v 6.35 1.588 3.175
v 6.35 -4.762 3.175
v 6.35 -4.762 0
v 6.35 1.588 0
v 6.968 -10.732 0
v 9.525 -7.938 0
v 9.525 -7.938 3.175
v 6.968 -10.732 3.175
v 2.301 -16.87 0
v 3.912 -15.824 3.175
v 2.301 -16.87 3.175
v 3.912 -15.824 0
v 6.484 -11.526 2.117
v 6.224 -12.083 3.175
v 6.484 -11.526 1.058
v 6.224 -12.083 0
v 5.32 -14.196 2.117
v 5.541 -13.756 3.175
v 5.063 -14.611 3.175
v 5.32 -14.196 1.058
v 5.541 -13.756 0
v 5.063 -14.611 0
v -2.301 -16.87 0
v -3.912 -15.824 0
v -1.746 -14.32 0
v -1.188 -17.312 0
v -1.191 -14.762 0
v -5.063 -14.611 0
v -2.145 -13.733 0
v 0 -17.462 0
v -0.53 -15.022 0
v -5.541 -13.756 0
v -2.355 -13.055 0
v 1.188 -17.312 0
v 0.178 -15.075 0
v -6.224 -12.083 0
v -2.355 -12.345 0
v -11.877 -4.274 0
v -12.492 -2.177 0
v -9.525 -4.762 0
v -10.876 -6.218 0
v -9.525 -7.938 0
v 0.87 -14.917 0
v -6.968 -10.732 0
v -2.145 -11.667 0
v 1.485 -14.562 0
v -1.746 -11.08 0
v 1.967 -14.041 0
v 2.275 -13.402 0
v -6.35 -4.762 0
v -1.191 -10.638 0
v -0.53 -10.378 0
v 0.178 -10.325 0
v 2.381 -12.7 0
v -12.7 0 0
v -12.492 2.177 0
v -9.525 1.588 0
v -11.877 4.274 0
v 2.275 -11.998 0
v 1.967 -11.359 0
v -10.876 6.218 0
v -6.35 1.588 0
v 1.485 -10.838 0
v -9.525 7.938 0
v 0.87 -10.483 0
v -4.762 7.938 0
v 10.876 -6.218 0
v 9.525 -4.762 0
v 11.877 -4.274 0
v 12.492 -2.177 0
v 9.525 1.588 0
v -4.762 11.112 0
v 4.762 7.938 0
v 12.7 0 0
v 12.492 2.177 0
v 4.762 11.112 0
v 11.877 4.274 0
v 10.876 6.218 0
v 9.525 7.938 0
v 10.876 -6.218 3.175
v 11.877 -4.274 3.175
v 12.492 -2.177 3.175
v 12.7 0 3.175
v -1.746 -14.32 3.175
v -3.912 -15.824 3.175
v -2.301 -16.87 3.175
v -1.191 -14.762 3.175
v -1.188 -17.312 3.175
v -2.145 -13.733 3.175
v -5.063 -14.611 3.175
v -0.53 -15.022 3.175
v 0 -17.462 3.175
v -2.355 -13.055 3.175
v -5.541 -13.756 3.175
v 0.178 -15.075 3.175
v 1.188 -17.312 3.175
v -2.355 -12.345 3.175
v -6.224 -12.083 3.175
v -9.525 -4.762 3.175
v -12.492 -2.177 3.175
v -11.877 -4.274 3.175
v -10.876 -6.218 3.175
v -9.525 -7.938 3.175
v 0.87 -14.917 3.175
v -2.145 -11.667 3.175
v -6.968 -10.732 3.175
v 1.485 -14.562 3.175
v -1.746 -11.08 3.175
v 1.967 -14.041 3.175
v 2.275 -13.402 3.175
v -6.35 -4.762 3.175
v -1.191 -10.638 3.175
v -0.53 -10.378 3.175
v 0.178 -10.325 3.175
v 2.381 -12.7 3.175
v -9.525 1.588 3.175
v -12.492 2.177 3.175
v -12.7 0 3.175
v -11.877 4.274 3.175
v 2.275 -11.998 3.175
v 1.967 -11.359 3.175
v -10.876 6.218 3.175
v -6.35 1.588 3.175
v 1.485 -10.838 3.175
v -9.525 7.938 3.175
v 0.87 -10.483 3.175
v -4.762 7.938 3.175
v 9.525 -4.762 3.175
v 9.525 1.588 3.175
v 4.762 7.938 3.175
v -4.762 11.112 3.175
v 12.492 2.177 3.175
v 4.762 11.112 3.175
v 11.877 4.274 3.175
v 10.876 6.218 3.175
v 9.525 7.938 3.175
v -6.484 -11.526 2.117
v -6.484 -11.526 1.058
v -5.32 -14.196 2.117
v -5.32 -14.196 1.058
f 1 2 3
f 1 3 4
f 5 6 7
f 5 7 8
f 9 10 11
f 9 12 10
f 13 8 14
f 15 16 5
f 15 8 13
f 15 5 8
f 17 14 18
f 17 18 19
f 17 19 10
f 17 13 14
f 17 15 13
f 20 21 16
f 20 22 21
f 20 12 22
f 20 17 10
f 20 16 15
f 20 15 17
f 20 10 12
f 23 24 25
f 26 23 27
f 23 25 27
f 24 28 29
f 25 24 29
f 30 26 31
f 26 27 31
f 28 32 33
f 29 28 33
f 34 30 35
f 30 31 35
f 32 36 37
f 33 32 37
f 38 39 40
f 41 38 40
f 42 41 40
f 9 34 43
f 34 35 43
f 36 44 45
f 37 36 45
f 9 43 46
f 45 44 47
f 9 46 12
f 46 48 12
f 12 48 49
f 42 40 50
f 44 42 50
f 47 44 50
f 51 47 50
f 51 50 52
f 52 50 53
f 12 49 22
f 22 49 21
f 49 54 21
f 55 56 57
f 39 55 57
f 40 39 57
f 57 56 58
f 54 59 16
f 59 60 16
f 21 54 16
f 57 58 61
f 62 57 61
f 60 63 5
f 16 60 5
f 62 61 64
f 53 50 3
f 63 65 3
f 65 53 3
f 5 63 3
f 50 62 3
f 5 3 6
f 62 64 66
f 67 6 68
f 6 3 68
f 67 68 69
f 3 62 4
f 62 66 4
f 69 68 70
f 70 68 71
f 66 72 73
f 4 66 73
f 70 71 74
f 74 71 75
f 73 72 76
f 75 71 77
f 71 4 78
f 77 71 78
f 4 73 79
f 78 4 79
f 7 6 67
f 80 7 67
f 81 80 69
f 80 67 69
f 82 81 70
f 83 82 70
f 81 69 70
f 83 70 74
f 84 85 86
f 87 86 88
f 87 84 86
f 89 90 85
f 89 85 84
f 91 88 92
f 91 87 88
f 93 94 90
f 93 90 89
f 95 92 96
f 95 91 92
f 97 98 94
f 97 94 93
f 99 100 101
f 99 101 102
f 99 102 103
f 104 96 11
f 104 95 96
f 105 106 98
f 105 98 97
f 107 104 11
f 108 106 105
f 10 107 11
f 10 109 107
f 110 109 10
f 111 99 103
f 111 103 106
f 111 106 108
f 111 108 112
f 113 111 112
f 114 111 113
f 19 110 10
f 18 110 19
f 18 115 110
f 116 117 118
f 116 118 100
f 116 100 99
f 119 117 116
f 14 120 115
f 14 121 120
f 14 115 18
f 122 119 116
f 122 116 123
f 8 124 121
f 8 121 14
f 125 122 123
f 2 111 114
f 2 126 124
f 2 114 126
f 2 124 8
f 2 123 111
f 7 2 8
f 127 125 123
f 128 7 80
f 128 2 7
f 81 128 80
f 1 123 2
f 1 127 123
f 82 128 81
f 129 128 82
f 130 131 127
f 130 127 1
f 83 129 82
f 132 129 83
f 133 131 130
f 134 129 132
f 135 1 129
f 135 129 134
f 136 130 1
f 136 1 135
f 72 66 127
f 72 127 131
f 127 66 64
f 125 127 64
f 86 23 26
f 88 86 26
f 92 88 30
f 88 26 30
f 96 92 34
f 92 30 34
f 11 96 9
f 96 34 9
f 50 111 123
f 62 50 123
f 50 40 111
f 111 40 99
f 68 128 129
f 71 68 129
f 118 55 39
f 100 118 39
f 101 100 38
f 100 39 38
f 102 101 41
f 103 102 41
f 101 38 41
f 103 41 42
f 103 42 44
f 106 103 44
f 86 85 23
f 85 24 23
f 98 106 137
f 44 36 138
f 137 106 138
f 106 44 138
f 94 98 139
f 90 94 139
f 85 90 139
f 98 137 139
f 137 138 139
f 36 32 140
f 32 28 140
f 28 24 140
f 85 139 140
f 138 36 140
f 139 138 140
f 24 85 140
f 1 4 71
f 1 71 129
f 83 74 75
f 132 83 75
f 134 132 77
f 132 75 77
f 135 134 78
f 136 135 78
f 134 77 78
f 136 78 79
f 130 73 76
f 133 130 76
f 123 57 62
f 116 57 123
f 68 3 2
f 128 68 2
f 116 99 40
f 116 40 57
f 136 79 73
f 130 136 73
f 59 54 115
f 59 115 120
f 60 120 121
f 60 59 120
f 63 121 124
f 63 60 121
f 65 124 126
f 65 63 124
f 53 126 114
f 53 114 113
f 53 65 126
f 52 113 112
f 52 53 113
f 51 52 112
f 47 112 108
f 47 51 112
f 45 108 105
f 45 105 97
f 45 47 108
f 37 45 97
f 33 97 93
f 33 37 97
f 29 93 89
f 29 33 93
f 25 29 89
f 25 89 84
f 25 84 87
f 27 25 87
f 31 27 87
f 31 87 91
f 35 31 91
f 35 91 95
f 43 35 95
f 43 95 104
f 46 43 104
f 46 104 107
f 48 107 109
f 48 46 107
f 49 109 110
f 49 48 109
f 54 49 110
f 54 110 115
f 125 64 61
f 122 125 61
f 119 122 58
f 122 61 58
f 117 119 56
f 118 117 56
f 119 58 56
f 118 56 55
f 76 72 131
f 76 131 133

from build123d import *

# Parameters (mm, degrees)
SKETCH1_W           = 9.525
SKETCH1_H           = 3.175
SKETCH1_R           = 2.38125
BOSS_EXTRUDE1_DEPTH = 3.175
CAVITY1_START       = -9.525
CAVITY1_OUTLINE_W   = 6.35
CAVITY1_OUTLINE_H   = 3.175
CAVITY1_DEPTH       = 3.175
CAVITY1_START_2     = 6.35
CAVITY1_2_OUTLINE_W = 6.35
CAVITY1_2_OUTLINE_H = 3.175
CAVITY1_2_DEPTH     = 3.175


# Read off the part's stored shape, not the designer's step: Cavity1
with BuildPart() as part:
    # Sketch1 → Boss-Extrude1 (new body)
    # profile 1 of 10: a face of its own
    with BuildSketch(Plane.XY):
        with BuildLine():
            ThreePointArc((-9.525, 7.9375), (-11.876811414, 4.274474566), (-12.7, 0))
            Line((-12.7, 0), (-9.525, 0))
            Line((-9.525, 0), (-9.525, 7.9375))
        make_face()
    # profile 2 of 10: a face of its own
    with BuildSketch(Plane.XY):
        with BuildLine():
            Line((-9.525, 0), (-12.7, 0))
            ThreePointArc((-12.7, 0), (-11.876811414, -4.274474566), (-9.525, -7.9375))
            Line((-9.525, -7.9375), (-9.525, 0))
        make_face()
    # profile 3 of 10: a face of its own
    with BuildSketch(Plane.XY):
        Polygon((-9.525, 7.9375), (-9.525, 0), (0, 0), (9.525, 0), (9.525, 7.9375), (4.7625, 7.9375), (-4.7625, 7.9375), align=None)
    # profile 4 of 10: a face of its own
    with BuildSketch(Plane.XY):
        Polygon((0, 0), (-9.525, 0), (-9.525, -7.9375), (0, -7.9375), (9.525, -7.9375), (9.525, 0), align=None)
    # profile 5 of 10: a face of its own
    with BuildSketch(Plane.XY):
        with BuildLine():
            Line((0, -7.9375), (-9.525, -7.9375))
            add(Edge.make_bspline(
                [(-9.525, -7.9375), (-8.354743729, -9.166269084), (-6.479229503, -10.75772626), (-5.396989703, -14.77189499), (-3.721125314, -16.086113374), (-2.300921541, -16.869792119)],
                knots=[0, 0, 0, 0, 0.40377748, 0.653864755, 1, 1, 1, 1], degree=3))
            ThreePointArc((-2.300921541, -16.869792119), (-4.611943257, -11.511982474), (0, -7.9375))
        make_face()
    # profile 6 of 10: a face of its own
    with BuildSketch(Plane.XY):
        with Locations((0, 9.525)):
            Rectangle(SKETCH1_W, SKETCH1_H)
    # profile 7 of 10: a face of its own
    with BuildSketch(Plane.XY):
        with BuildLine():
            Line((9.525, -7.9375), (0, -7.9375))
            ThreePointArc((0, -7.9375), (3.367596045, -9.332403955), (4.7625, -12.7))
            ThreePointArc((4.7625, -12.7), (4.1011916, -15.121081103), (2.300921541, -16.869792119))
            add(Edge.make_bspline(
                [(9.525, -7.9375), (8.354743729, -9.166269084), (6.479229503, -10.75772626), (5.396989703, -14.77189499), (3.721125314, -16.086113374), (2.300921541, -16.869792119)],
                knots=[0, 0, 0, 0, 0.40377748, 0.653864755, 1, 1, 1, 1], degree=3))
        make_face()
    # profile 8 of 10: a face of its own
    with BuildSketch(Plane.XY):
        with BuildLine():
            ThreePointArc((4.7625, -12.7), (3.367596045, -9.332403955), (0, -7.9375))
            ThreePointArc((0, -7.9375), (-4.611943257, -11.511982474), (-2.300921541, -16.869792119))
            ThreePointArc((-2.300921541, -16.869792119), (0, -17.4625), (2.300921541, -16.869792119))
            ThreePointArc((2.300921541, -16.869792119), (4.1011916, -15.121081103), (4.7625, -12.7))
        make_face()
        with Locations((0, -12.7)):
            Circle(SKETCH1_R, mode=Mode.SUBTRACT)
    # profile 9 of 10: a face of its own
    with BuildSketch(Plane.XY):
        with BuildLine():
            Line((9.525, 7.9375), (9.525, 0))
            Line((9.525, 0), (12.7, 0))
            ThreePointArc((12.7, 0), (11.876811414, 4.274474566), (9.525, 7.9375))
        make_face()
    # profile 10 of 10: a face of its own
    with BuildSketch(Plane.XY):
        with BuildLine():
            Line((12.7, 0), (9.525, 0))
            Line((9.525, 0), (9.525, -7.9375))
            ThreePointArc((9.525, -7.9375), (11.876811414, -4.274474566), (12.7, 0))
        make_face()
    extrude(amount=BOSS_EXTRUDE1_DEPTH)

    # Cavity1 outline → Cavity1 (cut)
    with BuildSketch(Plane.YZ.offset(CAVITY1_START)):
        with Locations((-1.5875, 1.5875)):
            Rectangle(CAVITY1_OUTLINE_W, CAVITY1_OUTLINE_H)
    extrude(amount=CAVITY1_DEPTH, mode=Mode.SUBTRACT)

    # Cavity1 2 outline → Cavity1 2 (cut)
    with BuildSketch(Plane.YZ.offset(CAVITY1_START_2)):
        with Locations((-1.5875, 1.5875)):
            Rectangle(CAVITY1_2_OUTLINE_W, CAVITY1_2_OUTLINE_H)
    extrude(amount=CAVITY1_2_DEPTH, mode=Mode.SUBTRACT)


solid = part.part
